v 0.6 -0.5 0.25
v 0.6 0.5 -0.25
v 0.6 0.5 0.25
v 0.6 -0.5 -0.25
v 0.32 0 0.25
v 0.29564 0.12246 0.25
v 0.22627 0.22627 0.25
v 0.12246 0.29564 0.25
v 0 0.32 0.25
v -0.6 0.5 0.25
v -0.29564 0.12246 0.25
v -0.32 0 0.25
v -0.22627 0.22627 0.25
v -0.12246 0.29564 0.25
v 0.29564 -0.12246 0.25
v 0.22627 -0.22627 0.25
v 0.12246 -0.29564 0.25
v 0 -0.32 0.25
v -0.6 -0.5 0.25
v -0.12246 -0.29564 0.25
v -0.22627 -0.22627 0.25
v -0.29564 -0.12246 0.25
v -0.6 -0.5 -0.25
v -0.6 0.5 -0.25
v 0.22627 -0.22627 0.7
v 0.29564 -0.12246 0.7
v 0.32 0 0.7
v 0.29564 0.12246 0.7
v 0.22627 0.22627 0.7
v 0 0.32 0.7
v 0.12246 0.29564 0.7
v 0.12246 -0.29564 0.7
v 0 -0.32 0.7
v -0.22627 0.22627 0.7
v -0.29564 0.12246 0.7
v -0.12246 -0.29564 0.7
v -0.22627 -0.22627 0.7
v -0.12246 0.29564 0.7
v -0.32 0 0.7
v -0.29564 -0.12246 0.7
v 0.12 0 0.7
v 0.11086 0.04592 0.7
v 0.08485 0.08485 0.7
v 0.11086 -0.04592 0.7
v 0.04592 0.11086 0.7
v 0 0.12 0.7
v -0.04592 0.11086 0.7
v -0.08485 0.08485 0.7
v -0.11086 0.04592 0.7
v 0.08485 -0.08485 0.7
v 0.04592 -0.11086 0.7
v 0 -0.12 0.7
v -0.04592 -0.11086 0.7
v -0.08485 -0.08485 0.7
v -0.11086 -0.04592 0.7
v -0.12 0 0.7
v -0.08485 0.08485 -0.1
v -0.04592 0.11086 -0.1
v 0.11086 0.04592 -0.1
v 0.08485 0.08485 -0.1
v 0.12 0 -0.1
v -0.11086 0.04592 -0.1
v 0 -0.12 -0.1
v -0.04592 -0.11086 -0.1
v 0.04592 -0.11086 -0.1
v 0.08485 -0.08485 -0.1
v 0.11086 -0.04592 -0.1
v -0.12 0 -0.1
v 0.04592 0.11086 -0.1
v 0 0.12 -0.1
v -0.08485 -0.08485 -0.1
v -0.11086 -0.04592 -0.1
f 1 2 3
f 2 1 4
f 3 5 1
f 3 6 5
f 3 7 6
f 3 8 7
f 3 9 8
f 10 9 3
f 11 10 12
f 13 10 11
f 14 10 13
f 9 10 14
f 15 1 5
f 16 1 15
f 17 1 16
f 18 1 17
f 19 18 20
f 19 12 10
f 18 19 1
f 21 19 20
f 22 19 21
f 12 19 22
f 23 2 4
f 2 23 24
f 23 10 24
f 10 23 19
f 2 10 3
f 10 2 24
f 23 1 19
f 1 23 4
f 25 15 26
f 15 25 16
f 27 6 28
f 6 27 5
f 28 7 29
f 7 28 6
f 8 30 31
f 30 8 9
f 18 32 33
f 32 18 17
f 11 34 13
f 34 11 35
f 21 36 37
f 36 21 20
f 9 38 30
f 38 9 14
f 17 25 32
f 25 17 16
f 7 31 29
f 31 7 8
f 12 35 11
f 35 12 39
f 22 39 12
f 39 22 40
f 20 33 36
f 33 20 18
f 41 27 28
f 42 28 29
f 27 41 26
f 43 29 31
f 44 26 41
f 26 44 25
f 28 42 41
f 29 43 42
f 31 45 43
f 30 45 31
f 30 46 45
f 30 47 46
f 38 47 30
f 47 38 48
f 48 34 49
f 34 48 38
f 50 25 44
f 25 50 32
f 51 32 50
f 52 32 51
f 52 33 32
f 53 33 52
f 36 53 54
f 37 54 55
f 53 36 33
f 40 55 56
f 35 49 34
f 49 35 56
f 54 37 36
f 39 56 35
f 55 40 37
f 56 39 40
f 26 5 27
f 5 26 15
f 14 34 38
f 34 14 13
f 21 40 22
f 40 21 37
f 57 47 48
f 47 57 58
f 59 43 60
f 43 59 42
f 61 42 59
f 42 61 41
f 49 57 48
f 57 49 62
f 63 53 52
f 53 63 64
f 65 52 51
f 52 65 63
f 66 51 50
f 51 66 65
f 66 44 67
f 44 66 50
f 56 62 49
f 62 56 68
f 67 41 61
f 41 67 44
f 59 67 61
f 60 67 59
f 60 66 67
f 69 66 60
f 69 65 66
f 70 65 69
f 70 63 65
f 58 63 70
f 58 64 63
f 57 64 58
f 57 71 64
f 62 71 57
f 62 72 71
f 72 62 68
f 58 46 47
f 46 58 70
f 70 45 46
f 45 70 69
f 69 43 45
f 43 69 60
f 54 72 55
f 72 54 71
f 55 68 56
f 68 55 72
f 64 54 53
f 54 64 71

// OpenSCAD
// External OpenSCAD compiler smoke fixture.
// Covers primitives, transforms, and booleans in one tiny printable solid.
difference() {
  union() {
    cube([1.2, 1.0, 0.5], center = true);
    translate([0.0, 0.0, 0.35])
      cylinder(h = 0.7, r = 0.32, center = true, $fn = 16);
  }

  translate([0.0, 0.0, 0.35])
    cylinder(h = 0.9, r = 0.12, center = true, $fn = 16);
}
